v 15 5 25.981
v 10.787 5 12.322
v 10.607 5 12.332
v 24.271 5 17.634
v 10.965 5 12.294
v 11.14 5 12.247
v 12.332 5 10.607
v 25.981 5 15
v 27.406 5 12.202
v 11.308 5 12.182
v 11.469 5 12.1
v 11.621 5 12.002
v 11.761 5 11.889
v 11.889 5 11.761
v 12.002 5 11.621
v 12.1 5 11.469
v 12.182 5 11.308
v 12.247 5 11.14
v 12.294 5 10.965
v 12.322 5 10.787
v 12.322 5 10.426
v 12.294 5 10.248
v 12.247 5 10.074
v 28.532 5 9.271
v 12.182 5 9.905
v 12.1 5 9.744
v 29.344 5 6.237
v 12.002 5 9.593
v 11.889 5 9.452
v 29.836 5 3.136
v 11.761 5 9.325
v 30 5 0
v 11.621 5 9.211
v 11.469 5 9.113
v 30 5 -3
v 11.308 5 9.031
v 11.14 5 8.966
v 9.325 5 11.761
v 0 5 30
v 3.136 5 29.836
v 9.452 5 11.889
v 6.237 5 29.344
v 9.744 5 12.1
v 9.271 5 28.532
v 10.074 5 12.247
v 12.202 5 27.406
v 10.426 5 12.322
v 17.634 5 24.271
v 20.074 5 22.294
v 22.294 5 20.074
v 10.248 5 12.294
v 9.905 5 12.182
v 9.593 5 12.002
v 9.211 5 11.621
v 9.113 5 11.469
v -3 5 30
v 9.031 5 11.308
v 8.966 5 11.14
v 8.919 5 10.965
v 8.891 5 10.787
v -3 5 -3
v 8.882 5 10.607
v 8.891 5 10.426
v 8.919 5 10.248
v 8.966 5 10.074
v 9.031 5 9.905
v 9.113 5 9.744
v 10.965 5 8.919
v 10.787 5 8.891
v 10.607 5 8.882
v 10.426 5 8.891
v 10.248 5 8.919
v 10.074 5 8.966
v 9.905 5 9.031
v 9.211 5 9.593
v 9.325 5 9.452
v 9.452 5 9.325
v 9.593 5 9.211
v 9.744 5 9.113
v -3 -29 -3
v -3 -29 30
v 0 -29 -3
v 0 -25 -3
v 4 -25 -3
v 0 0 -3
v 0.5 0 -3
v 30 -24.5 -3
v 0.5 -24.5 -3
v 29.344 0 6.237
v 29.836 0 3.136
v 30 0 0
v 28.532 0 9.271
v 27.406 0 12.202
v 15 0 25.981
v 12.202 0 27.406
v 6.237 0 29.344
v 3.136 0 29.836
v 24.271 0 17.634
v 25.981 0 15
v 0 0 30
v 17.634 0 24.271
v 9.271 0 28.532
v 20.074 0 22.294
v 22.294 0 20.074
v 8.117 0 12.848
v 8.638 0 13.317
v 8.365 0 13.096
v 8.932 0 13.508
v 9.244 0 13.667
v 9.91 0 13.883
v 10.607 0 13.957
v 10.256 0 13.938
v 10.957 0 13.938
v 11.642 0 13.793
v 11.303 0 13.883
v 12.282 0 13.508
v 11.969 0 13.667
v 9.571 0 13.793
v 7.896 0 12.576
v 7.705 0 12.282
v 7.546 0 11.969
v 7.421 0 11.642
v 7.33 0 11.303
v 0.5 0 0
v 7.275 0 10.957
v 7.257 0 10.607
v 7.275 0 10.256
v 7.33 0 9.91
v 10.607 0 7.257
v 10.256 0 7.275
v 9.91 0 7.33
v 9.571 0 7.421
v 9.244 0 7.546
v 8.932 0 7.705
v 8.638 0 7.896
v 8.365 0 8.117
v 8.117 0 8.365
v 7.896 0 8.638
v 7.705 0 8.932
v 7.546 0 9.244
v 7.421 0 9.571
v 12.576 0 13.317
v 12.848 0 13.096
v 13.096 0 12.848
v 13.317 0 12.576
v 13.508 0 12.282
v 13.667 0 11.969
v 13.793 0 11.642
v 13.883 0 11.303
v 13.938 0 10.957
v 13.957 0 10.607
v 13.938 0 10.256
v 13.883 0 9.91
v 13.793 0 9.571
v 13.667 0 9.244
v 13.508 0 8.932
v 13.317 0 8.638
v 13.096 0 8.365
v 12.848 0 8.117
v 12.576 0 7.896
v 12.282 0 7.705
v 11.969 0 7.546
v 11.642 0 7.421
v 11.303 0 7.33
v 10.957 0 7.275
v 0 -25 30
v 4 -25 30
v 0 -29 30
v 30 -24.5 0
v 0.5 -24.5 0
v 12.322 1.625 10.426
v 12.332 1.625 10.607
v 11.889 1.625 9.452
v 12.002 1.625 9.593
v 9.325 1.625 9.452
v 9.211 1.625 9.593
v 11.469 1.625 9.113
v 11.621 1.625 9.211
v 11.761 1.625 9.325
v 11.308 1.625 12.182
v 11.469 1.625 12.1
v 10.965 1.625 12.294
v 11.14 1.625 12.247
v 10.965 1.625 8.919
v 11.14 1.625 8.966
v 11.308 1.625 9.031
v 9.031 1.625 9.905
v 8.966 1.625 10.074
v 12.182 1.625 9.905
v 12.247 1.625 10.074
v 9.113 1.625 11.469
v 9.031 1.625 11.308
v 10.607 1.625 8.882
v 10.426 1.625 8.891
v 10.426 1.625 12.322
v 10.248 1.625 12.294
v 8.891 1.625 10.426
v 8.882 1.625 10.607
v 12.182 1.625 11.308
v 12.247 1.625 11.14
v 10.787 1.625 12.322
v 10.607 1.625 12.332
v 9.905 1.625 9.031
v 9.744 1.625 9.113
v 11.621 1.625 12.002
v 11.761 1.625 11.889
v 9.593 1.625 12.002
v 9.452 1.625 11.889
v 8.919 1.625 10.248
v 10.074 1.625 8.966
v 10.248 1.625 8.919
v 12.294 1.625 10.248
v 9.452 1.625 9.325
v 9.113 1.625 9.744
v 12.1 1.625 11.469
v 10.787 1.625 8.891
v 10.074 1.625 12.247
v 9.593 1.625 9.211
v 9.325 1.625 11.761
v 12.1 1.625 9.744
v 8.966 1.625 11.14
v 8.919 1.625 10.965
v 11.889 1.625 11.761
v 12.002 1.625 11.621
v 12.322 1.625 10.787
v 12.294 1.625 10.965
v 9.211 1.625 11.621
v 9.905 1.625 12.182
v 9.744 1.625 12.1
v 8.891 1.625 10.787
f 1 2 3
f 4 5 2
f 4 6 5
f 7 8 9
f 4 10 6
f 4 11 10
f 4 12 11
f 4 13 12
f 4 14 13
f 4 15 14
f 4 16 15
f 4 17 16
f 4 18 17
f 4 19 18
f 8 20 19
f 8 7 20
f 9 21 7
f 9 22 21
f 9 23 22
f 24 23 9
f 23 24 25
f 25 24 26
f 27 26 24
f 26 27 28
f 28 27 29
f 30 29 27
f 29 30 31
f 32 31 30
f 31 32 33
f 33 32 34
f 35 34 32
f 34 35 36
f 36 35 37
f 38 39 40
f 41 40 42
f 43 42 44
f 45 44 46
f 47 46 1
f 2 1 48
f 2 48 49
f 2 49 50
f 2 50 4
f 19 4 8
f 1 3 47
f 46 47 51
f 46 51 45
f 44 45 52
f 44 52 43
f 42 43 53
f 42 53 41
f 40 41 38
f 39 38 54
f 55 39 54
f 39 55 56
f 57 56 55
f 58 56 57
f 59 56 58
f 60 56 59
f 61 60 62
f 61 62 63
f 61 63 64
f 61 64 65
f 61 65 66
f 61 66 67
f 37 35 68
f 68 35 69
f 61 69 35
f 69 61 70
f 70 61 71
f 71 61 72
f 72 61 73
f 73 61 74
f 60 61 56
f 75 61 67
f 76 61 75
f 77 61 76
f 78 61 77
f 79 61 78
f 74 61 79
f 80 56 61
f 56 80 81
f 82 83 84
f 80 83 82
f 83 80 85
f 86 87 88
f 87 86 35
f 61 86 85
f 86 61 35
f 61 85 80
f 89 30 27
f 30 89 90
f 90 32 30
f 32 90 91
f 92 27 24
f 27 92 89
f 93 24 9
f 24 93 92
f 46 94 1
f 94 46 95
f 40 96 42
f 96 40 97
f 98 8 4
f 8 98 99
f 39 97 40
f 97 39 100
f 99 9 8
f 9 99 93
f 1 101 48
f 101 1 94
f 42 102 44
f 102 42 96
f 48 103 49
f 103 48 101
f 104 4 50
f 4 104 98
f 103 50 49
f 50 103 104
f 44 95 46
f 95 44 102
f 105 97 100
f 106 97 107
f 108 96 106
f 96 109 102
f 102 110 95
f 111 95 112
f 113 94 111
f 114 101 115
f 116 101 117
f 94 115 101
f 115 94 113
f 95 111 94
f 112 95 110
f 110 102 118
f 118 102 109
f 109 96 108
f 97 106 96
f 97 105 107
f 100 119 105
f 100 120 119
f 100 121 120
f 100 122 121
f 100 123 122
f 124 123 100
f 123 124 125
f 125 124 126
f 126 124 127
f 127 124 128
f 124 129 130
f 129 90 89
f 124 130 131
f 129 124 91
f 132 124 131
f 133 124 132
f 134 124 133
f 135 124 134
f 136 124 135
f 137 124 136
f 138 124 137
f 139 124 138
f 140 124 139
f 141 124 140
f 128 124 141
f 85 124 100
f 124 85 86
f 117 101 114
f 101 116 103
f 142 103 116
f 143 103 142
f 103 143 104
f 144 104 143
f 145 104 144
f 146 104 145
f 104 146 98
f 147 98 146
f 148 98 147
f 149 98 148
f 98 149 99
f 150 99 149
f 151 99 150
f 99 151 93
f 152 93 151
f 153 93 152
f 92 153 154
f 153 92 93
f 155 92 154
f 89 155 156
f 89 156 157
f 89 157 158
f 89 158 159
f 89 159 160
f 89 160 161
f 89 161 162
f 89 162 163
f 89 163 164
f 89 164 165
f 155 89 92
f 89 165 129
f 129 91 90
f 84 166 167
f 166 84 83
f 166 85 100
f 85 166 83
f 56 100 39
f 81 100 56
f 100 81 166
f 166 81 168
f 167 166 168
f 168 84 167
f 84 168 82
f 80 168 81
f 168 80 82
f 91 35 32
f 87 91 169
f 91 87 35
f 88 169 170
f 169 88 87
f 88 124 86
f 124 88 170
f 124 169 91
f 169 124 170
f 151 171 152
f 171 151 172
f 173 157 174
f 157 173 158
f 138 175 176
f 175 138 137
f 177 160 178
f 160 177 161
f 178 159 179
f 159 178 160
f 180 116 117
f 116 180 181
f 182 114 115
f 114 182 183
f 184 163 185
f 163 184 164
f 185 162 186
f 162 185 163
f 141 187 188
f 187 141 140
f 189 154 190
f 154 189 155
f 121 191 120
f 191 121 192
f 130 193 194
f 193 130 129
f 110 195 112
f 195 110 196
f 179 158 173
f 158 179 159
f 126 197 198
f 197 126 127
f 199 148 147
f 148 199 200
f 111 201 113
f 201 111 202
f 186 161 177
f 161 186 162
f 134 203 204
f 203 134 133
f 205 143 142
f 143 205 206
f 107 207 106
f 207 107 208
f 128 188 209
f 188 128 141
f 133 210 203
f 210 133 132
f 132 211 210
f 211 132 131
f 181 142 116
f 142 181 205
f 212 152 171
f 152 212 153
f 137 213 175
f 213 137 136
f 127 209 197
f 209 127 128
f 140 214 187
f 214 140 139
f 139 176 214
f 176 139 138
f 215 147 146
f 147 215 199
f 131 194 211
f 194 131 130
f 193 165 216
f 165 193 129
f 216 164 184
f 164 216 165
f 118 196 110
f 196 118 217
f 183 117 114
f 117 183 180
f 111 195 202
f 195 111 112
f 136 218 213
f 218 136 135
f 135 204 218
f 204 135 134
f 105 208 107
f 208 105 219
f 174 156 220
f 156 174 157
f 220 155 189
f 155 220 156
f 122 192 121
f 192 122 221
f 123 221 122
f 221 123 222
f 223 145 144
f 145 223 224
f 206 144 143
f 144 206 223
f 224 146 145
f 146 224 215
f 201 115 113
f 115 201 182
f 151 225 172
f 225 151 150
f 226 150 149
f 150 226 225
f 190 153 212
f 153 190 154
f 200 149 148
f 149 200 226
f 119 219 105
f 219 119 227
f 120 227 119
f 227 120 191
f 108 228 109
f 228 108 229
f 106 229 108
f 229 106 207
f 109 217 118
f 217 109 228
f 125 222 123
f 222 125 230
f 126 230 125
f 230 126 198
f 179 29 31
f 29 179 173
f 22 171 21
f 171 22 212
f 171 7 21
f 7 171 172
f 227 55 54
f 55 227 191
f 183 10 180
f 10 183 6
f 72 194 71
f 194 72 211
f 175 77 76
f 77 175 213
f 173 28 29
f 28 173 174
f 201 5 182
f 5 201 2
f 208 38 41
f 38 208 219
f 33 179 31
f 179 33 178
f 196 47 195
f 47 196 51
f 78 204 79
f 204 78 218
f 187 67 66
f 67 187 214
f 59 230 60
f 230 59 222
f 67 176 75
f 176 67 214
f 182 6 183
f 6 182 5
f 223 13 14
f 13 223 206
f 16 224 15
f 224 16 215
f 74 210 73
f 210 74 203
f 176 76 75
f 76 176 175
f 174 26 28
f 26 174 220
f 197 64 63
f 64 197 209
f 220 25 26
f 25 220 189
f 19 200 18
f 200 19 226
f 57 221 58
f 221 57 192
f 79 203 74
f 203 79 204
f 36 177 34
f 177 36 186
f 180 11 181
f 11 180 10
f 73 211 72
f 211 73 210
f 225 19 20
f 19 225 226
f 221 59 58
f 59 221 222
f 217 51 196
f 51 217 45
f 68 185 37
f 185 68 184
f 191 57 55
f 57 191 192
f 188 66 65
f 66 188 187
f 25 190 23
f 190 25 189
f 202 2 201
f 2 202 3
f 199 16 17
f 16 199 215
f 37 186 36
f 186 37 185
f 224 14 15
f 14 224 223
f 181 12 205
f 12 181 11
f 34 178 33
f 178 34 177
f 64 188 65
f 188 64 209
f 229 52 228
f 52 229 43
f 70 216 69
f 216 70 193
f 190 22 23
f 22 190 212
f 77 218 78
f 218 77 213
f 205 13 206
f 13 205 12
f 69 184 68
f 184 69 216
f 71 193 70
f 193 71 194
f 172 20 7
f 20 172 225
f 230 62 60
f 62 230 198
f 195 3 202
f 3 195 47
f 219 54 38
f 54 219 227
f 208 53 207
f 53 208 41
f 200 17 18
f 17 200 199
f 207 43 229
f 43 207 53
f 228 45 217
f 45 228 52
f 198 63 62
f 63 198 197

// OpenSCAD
// 3D Printable Surface Mount
// Copyright (C) 2017  Daniel Benoy  <daniel@benoy.name>
//
// This program is free software: you can redistribute it and/or modify
// it under the terms of the GNU General Public License as published by
// the Free Software Foundation, either version 3 of the License, or
// (at your option) any later version.
// 
// This program is distributed in the hope that it will be useful,
// but WITHOUT ANY WARRANTY; without even the implied warranty of
// MERCHANTABILITY or FITNESS FOR A PARTICULAR PURPOSE.  See the
// GNU General Public License for more details.
// 
// You should have received a copy of the GNU General Public License
// along with this program.  If not, see <http://www.gnu.org/licenses/>.

$fn=60;

//CUSTOMIZER VARIABLES

// Whether to place an edge holder on the side(s) of the stand
type = 0; // [0:Corner-A, 1:Corner-B, 2:Side]

// The width of the entire bracket not counting the clip thickness
bracket_width=30;

// The thickness of the clips (the parts that grip on the object with the tooth on top)
clip_thickness=3;

// How deep and tall the teeth are
tooth_size=4;

// The height of the object that will be put in the bracket
height=25;

// The thickness of the base of the object (Make sure it's thick enough to accomodate your desired screw size)
base_thickness=5;

// The diameter of the screw hole
screw_diameter=3.45;

// The diameter of the head of the screw (For countersinking)
screw_head_diameter=6.9;

// The separation tolerance (This is to prevent things from fusing together that aren't supposed to, and will depend on your printer. You probably don't have to change this)
tolerence=0.5;

//CUSTOMIZER VARIABLES END


module clip(width, height, thickness, tooth_size) {
    cube([thickness, width, height + tooth_size]);
    translate([thickness, 0, 0]) translate([0, 0, height]) intersection() {
        cube([tooth_size, width, tooth_size]);
        translate([0, 0, tooth_size]) rotate([0, 135, 0]) cube([tooth_size * sqrt(2), width, tooth_size * sqrt(2)]);
    }
}

module fh_screw_hole(diameter, head_diameter, length) {
    cylinder(d1=head_diameter, d2=0, h=head_diameter/2);
    cylinder(d=diameter, h=length);
}

module surface_mount_corner(
    tolerence=tolerence,
    bracket_width=bracket_width,
    height=height,
    base_thickness=base_thickness,
    clip_thickness=clip_thickness,
    tooth_size=tooth_size,
    screw_diameter=screw_diameter,
    screw_head_diameter=screw_head_diameter
) {
    rotate([90, 0, 0]) translate([-clip_thickness, -clip_thickness, -base_thickness]) difference() {
        union() {
            intersection() {
                cube([clip_thickness + bracket_width, clip_thickness + bracket_width, height + tooth_size + base_thickness]);
                translate([clip_thickness, clip_thickness, 0]) cylinder(h=height + tooth_size + base_thickness, r=bracket_width);
                cube([bracket_width + clip_thickness, bracket_width + clip_thickness, base_thickness]);
            }
            clip(width=bracket_width + clip_thickness, height=height + base_thickness, thickness=clip_thickness, tooth_size=tooth_size);
            translate([clip_thickness + tolerence, 0, 0]) cube([bracket_width - tolerence, clip_thickness, height + base_thickness - tolerence]);
        }
        translate([bracket_width * cos(45) / 2 + clip_thickness, bracket_width * sin(45) / 2 + clip_thickness, base_thickness + 0.1]) rotate([180, 0, 0]) fh_screw_hole(diameter=screw_diameter, head_diameter=screw_head_diameter, length=base_thickness+0.2);
    }
}

module surface_mount_side(
    bracket_width=bracket_width,
    height=height,
    base_thickness=base_thickness,
    clip_thickness=clip_thickness,
    tooth_size=tooth_size,
    screw_diameter=screw_diameter,
    screw_head_diameter=screw_head_diameter
) {
    rotate([90, 0, 0]) translate([-clip_thickness, 0, -base_thickness]) difference() {
        intersection() {
            cube([bracket_width + clip_thickness, bracket_width + clip_thickness, height + tooth_size + base_thickness]);
            union() {
                cube([bracket_width/3 + clip_thickness, bracket_width, height + tooth_size + base_thickness]);
                translate([bracket_width/3 + clip_thickness, bracket_width/2, 0]) cylinder(h=height + tooth_size + base_thickness, d=bracket_width);
            }
            union() {
                cube([bracket_width + clip_thickness, bracket_width, base_thickness]);
                translate([0, 0, base_thickness]) clip(width=bracket_width, height=height, thickness=clip_thickness, tooth_size=tooth_size);
            }
        }
        translate([clip_thickness + bracket_width/2.5, bracket_width/2, base_thickness + 0.1]) rotate([180, 0, 0]) fh_screw_hole(diameter=screw_diameter, head_diameter=screw_head_diameter, length=base_thickness+0.2);
    }
}

if (type == 0) {
    surface_mount_corner();
} else if (type == 1) {
    mirror([1, 0, 0]) surface_mount_corner();
} else if (type == 2) {
    surface_mount_side();
}

// A little demo for screen shotting
if (false) {
    translate([80, 0, -80]) mirror([1, 0, 0]) surface_mount_corner();
    translate([-80, 0, -80]) surface_mount_corner();
    translate([80, 0, 80]) rotate([0, 180, 0]) surface_mount_corner();
    translate([-80, 0, 80]) mirror([1, 0, 0]) rotate([0, 180, 0]) surface_mount_corner();
    translate([80, 0, 15]) rotate([0, 180, 0]) surface_mount_side();
    translate([-80, 0, -15]) surface_mount_side();
}
